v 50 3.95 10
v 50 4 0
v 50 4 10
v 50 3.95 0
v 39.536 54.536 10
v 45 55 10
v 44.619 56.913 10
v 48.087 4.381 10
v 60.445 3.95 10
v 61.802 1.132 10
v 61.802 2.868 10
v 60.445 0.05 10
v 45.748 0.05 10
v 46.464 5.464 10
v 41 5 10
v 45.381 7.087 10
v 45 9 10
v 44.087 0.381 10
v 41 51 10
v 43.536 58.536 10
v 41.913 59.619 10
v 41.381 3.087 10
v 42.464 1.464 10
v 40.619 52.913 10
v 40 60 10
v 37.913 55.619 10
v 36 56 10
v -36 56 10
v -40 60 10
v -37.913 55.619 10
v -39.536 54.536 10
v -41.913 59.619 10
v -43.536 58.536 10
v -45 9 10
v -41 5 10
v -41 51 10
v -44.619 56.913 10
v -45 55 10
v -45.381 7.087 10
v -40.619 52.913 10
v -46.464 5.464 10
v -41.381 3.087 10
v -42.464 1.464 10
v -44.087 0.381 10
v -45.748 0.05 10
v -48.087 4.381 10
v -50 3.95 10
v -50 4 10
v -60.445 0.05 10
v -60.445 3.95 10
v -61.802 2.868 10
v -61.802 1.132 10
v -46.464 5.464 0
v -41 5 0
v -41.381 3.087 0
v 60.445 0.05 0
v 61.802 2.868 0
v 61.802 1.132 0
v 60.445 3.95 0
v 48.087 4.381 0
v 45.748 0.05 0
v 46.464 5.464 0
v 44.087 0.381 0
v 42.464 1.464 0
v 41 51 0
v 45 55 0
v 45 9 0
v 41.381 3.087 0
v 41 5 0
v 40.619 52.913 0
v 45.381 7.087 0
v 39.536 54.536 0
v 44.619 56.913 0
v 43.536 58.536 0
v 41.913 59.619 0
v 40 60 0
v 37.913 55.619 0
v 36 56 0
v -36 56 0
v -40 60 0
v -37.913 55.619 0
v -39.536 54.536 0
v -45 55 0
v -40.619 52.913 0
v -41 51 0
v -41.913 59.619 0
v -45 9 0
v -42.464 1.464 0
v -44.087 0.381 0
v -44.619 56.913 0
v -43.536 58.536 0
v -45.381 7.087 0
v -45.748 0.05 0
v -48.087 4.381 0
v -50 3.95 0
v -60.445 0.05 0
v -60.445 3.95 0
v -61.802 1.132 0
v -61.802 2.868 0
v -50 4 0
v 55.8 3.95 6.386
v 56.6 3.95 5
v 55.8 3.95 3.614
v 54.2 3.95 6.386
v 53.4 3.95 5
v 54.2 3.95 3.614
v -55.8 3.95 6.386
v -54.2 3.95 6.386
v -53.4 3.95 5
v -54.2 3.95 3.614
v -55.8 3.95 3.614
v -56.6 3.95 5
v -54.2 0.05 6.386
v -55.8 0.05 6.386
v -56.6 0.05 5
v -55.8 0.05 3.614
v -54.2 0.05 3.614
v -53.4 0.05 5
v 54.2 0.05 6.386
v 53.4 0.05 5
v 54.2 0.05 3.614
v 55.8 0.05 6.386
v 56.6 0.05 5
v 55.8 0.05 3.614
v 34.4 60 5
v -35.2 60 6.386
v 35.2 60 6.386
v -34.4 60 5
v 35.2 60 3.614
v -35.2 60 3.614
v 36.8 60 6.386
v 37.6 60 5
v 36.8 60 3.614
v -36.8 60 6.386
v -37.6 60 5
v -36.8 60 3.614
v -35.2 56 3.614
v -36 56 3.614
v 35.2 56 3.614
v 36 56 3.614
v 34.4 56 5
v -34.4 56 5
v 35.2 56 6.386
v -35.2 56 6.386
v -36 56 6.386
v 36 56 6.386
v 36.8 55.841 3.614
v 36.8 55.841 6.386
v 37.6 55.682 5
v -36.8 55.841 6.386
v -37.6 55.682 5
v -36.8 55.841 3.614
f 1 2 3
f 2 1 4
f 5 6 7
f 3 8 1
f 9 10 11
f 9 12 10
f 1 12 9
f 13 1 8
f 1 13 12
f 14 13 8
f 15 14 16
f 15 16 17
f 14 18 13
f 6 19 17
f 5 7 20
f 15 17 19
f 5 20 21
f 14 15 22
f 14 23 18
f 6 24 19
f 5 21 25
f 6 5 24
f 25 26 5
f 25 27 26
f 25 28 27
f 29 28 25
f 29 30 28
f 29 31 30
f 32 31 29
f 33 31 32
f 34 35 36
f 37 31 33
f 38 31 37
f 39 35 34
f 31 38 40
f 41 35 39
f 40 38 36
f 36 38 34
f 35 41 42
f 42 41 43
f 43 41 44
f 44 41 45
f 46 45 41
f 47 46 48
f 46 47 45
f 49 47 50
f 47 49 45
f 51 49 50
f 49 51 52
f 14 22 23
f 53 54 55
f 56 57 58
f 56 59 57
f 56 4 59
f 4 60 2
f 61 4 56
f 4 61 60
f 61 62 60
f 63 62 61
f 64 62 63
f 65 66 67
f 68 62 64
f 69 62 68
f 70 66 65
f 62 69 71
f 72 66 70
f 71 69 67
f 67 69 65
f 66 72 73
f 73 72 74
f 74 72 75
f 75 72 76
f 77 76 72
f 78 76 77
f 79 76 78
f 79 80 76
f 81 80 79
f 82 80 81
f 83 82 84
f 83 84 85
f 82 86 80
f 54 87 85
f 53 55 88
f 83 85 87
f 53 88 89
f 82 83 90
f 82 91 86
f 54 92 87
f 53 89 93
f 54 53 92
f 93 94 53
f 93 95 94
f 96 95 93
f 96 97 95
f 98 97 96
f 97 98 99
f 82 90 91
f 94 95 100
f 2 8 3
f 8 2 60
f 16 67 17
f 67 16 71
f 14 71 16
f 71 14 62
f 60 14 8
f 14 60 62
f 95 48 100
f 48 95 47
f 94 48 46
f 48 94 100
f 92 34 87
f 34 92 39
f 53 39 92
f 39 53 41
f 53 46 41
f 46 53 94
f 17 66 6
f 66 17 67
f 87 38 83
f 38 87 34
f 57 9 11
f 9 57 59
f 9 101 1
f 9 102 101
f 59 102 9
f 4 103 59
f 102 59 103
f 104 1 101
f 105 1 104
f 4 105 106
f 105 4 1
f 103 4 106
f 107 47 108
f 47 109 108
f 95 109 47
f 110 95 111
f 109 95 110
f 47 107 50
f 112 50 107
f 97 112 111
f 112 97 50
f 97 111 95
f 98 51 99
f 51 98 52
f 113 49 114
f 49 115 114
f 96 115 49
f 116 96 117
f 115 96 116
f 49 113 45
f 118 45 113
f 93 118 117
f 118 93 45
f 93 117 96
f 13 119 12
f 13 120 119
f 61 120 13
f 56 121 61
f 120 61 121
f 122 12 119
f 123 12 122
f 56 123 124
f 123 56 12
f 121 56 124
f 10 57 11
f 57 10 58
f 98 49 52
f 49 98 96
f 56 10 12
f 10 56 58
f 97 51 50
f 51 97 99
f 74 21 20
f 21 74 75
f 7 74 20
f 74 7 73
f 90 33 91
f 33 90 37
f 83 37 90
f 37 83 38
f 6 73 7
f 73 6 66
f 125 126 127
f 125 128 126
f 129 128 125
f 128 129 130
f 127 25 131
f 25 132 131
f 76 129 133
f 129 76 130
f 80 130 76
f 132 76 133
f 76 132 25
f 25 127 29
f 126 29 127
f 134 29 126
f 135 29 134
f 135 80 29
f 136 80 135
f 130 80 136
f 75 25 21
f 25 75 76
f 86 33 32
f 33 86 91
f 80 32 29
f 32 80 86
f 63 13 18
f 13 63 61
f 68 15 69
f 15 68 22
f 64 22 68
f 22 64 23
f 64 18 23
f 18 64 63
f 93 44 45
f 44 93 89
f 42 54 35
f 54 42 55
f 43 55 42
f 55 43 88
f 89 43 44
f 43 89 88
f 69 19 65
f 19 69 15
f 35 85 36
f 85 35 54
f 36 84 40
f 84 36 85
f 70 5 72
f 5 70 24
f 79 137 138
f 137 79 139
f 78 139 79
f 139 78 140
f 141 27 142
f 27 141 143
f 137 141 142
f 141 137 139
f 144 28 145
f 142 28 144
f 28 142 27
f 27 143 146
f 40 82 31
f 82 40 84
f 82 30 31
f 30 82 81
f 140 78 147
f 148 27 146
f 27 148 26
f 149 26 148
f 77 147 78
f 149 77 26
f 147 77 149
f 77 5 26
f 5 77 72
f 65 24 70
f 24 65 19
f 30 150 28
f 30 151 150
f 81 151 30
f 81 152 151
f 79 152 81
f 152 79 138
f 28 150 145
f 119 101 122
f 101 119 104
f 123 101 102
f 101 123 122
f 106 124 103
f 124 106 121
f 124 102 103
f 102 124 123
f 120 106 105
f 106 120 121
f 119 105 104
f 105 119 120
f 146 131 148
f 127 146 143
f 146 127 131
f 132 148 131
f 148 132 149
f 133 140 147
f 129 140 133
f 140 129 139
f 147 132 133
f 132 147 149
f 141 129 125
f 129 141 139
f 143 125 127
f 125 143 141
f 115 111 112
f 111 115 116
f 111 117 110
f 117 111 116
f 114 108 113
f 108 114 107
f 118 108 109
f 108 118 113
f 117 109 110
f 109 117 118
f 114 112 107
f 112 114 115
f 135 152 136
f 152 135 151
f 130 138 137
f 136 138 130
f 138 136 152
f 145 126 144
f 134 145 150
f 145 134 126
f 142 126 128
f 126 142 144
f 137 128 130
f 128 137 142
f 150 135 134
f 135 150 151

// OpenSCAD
// RAMPS Fan Mount
// Licence: CC BY-SA 3.0, http://creativecommons.org/licenses/by-sa/3.0/
// Author: Dominik Scholz <schlotzz@schlotzz.com> and contributors
// visit: http://www.schlotzz.com


width = 90;
heigth = 60;
e = 4;
depth = 10;

module ramps_fan_mount_cutoff_cube(width, height, depth, radius = 5)
{
    width2 = width + 30;
	union()
	{
		translate([-width/2, 0, 0]) cube([width, height - radius, depth]);
        hull()
		{
			for (i = [0,1]){
				mirror([i,0,0])translate([-width2/2, 2, 0])
					cylinder(r = 2, h = depth);
            }
		}
        
		hull()
		{
			for (i = [0,1]){
				mirror([i,0,0])translate([width/2-radius, height - radius, 0])
					cylinder(r = radius, h = depth);
            }
		}
        
        for (i = [0,1]){
            mirror([i,0,0]) 
                translate([width/2-1, 4-1, 0])
                difference(){
                    cube([radius+1, radius+1, depth]);
                    translate([radius+1, radius+1, -1]) cylinder(r = radius, h = depth+2);
                }
        }
	}
}

difference(){
    ramps_fan_mount_cutoff_cube(width, heigth, depth);
    translate([0, -4, -1]) ramps_fan_mount_cutoff_cube(width-2*e, heigth, depth+2);
    
    for (i = [0,1]){
        mirror([i,0,0]) translate([width/2+10, -1, depth/2]) rotate([-90,0,0])cylinder(r=1.6, 100);
        mirror([i,0,0]) translate([72/2, -1, depth/2]) rotate([-90,0,0])cylinder(r=1.6, 100);
    }
    
    
}
//ramps_fan_mount(fanDia= 72,  fanHoleDia = 3.1, fanHoleDist = 70, $fn = 32);
